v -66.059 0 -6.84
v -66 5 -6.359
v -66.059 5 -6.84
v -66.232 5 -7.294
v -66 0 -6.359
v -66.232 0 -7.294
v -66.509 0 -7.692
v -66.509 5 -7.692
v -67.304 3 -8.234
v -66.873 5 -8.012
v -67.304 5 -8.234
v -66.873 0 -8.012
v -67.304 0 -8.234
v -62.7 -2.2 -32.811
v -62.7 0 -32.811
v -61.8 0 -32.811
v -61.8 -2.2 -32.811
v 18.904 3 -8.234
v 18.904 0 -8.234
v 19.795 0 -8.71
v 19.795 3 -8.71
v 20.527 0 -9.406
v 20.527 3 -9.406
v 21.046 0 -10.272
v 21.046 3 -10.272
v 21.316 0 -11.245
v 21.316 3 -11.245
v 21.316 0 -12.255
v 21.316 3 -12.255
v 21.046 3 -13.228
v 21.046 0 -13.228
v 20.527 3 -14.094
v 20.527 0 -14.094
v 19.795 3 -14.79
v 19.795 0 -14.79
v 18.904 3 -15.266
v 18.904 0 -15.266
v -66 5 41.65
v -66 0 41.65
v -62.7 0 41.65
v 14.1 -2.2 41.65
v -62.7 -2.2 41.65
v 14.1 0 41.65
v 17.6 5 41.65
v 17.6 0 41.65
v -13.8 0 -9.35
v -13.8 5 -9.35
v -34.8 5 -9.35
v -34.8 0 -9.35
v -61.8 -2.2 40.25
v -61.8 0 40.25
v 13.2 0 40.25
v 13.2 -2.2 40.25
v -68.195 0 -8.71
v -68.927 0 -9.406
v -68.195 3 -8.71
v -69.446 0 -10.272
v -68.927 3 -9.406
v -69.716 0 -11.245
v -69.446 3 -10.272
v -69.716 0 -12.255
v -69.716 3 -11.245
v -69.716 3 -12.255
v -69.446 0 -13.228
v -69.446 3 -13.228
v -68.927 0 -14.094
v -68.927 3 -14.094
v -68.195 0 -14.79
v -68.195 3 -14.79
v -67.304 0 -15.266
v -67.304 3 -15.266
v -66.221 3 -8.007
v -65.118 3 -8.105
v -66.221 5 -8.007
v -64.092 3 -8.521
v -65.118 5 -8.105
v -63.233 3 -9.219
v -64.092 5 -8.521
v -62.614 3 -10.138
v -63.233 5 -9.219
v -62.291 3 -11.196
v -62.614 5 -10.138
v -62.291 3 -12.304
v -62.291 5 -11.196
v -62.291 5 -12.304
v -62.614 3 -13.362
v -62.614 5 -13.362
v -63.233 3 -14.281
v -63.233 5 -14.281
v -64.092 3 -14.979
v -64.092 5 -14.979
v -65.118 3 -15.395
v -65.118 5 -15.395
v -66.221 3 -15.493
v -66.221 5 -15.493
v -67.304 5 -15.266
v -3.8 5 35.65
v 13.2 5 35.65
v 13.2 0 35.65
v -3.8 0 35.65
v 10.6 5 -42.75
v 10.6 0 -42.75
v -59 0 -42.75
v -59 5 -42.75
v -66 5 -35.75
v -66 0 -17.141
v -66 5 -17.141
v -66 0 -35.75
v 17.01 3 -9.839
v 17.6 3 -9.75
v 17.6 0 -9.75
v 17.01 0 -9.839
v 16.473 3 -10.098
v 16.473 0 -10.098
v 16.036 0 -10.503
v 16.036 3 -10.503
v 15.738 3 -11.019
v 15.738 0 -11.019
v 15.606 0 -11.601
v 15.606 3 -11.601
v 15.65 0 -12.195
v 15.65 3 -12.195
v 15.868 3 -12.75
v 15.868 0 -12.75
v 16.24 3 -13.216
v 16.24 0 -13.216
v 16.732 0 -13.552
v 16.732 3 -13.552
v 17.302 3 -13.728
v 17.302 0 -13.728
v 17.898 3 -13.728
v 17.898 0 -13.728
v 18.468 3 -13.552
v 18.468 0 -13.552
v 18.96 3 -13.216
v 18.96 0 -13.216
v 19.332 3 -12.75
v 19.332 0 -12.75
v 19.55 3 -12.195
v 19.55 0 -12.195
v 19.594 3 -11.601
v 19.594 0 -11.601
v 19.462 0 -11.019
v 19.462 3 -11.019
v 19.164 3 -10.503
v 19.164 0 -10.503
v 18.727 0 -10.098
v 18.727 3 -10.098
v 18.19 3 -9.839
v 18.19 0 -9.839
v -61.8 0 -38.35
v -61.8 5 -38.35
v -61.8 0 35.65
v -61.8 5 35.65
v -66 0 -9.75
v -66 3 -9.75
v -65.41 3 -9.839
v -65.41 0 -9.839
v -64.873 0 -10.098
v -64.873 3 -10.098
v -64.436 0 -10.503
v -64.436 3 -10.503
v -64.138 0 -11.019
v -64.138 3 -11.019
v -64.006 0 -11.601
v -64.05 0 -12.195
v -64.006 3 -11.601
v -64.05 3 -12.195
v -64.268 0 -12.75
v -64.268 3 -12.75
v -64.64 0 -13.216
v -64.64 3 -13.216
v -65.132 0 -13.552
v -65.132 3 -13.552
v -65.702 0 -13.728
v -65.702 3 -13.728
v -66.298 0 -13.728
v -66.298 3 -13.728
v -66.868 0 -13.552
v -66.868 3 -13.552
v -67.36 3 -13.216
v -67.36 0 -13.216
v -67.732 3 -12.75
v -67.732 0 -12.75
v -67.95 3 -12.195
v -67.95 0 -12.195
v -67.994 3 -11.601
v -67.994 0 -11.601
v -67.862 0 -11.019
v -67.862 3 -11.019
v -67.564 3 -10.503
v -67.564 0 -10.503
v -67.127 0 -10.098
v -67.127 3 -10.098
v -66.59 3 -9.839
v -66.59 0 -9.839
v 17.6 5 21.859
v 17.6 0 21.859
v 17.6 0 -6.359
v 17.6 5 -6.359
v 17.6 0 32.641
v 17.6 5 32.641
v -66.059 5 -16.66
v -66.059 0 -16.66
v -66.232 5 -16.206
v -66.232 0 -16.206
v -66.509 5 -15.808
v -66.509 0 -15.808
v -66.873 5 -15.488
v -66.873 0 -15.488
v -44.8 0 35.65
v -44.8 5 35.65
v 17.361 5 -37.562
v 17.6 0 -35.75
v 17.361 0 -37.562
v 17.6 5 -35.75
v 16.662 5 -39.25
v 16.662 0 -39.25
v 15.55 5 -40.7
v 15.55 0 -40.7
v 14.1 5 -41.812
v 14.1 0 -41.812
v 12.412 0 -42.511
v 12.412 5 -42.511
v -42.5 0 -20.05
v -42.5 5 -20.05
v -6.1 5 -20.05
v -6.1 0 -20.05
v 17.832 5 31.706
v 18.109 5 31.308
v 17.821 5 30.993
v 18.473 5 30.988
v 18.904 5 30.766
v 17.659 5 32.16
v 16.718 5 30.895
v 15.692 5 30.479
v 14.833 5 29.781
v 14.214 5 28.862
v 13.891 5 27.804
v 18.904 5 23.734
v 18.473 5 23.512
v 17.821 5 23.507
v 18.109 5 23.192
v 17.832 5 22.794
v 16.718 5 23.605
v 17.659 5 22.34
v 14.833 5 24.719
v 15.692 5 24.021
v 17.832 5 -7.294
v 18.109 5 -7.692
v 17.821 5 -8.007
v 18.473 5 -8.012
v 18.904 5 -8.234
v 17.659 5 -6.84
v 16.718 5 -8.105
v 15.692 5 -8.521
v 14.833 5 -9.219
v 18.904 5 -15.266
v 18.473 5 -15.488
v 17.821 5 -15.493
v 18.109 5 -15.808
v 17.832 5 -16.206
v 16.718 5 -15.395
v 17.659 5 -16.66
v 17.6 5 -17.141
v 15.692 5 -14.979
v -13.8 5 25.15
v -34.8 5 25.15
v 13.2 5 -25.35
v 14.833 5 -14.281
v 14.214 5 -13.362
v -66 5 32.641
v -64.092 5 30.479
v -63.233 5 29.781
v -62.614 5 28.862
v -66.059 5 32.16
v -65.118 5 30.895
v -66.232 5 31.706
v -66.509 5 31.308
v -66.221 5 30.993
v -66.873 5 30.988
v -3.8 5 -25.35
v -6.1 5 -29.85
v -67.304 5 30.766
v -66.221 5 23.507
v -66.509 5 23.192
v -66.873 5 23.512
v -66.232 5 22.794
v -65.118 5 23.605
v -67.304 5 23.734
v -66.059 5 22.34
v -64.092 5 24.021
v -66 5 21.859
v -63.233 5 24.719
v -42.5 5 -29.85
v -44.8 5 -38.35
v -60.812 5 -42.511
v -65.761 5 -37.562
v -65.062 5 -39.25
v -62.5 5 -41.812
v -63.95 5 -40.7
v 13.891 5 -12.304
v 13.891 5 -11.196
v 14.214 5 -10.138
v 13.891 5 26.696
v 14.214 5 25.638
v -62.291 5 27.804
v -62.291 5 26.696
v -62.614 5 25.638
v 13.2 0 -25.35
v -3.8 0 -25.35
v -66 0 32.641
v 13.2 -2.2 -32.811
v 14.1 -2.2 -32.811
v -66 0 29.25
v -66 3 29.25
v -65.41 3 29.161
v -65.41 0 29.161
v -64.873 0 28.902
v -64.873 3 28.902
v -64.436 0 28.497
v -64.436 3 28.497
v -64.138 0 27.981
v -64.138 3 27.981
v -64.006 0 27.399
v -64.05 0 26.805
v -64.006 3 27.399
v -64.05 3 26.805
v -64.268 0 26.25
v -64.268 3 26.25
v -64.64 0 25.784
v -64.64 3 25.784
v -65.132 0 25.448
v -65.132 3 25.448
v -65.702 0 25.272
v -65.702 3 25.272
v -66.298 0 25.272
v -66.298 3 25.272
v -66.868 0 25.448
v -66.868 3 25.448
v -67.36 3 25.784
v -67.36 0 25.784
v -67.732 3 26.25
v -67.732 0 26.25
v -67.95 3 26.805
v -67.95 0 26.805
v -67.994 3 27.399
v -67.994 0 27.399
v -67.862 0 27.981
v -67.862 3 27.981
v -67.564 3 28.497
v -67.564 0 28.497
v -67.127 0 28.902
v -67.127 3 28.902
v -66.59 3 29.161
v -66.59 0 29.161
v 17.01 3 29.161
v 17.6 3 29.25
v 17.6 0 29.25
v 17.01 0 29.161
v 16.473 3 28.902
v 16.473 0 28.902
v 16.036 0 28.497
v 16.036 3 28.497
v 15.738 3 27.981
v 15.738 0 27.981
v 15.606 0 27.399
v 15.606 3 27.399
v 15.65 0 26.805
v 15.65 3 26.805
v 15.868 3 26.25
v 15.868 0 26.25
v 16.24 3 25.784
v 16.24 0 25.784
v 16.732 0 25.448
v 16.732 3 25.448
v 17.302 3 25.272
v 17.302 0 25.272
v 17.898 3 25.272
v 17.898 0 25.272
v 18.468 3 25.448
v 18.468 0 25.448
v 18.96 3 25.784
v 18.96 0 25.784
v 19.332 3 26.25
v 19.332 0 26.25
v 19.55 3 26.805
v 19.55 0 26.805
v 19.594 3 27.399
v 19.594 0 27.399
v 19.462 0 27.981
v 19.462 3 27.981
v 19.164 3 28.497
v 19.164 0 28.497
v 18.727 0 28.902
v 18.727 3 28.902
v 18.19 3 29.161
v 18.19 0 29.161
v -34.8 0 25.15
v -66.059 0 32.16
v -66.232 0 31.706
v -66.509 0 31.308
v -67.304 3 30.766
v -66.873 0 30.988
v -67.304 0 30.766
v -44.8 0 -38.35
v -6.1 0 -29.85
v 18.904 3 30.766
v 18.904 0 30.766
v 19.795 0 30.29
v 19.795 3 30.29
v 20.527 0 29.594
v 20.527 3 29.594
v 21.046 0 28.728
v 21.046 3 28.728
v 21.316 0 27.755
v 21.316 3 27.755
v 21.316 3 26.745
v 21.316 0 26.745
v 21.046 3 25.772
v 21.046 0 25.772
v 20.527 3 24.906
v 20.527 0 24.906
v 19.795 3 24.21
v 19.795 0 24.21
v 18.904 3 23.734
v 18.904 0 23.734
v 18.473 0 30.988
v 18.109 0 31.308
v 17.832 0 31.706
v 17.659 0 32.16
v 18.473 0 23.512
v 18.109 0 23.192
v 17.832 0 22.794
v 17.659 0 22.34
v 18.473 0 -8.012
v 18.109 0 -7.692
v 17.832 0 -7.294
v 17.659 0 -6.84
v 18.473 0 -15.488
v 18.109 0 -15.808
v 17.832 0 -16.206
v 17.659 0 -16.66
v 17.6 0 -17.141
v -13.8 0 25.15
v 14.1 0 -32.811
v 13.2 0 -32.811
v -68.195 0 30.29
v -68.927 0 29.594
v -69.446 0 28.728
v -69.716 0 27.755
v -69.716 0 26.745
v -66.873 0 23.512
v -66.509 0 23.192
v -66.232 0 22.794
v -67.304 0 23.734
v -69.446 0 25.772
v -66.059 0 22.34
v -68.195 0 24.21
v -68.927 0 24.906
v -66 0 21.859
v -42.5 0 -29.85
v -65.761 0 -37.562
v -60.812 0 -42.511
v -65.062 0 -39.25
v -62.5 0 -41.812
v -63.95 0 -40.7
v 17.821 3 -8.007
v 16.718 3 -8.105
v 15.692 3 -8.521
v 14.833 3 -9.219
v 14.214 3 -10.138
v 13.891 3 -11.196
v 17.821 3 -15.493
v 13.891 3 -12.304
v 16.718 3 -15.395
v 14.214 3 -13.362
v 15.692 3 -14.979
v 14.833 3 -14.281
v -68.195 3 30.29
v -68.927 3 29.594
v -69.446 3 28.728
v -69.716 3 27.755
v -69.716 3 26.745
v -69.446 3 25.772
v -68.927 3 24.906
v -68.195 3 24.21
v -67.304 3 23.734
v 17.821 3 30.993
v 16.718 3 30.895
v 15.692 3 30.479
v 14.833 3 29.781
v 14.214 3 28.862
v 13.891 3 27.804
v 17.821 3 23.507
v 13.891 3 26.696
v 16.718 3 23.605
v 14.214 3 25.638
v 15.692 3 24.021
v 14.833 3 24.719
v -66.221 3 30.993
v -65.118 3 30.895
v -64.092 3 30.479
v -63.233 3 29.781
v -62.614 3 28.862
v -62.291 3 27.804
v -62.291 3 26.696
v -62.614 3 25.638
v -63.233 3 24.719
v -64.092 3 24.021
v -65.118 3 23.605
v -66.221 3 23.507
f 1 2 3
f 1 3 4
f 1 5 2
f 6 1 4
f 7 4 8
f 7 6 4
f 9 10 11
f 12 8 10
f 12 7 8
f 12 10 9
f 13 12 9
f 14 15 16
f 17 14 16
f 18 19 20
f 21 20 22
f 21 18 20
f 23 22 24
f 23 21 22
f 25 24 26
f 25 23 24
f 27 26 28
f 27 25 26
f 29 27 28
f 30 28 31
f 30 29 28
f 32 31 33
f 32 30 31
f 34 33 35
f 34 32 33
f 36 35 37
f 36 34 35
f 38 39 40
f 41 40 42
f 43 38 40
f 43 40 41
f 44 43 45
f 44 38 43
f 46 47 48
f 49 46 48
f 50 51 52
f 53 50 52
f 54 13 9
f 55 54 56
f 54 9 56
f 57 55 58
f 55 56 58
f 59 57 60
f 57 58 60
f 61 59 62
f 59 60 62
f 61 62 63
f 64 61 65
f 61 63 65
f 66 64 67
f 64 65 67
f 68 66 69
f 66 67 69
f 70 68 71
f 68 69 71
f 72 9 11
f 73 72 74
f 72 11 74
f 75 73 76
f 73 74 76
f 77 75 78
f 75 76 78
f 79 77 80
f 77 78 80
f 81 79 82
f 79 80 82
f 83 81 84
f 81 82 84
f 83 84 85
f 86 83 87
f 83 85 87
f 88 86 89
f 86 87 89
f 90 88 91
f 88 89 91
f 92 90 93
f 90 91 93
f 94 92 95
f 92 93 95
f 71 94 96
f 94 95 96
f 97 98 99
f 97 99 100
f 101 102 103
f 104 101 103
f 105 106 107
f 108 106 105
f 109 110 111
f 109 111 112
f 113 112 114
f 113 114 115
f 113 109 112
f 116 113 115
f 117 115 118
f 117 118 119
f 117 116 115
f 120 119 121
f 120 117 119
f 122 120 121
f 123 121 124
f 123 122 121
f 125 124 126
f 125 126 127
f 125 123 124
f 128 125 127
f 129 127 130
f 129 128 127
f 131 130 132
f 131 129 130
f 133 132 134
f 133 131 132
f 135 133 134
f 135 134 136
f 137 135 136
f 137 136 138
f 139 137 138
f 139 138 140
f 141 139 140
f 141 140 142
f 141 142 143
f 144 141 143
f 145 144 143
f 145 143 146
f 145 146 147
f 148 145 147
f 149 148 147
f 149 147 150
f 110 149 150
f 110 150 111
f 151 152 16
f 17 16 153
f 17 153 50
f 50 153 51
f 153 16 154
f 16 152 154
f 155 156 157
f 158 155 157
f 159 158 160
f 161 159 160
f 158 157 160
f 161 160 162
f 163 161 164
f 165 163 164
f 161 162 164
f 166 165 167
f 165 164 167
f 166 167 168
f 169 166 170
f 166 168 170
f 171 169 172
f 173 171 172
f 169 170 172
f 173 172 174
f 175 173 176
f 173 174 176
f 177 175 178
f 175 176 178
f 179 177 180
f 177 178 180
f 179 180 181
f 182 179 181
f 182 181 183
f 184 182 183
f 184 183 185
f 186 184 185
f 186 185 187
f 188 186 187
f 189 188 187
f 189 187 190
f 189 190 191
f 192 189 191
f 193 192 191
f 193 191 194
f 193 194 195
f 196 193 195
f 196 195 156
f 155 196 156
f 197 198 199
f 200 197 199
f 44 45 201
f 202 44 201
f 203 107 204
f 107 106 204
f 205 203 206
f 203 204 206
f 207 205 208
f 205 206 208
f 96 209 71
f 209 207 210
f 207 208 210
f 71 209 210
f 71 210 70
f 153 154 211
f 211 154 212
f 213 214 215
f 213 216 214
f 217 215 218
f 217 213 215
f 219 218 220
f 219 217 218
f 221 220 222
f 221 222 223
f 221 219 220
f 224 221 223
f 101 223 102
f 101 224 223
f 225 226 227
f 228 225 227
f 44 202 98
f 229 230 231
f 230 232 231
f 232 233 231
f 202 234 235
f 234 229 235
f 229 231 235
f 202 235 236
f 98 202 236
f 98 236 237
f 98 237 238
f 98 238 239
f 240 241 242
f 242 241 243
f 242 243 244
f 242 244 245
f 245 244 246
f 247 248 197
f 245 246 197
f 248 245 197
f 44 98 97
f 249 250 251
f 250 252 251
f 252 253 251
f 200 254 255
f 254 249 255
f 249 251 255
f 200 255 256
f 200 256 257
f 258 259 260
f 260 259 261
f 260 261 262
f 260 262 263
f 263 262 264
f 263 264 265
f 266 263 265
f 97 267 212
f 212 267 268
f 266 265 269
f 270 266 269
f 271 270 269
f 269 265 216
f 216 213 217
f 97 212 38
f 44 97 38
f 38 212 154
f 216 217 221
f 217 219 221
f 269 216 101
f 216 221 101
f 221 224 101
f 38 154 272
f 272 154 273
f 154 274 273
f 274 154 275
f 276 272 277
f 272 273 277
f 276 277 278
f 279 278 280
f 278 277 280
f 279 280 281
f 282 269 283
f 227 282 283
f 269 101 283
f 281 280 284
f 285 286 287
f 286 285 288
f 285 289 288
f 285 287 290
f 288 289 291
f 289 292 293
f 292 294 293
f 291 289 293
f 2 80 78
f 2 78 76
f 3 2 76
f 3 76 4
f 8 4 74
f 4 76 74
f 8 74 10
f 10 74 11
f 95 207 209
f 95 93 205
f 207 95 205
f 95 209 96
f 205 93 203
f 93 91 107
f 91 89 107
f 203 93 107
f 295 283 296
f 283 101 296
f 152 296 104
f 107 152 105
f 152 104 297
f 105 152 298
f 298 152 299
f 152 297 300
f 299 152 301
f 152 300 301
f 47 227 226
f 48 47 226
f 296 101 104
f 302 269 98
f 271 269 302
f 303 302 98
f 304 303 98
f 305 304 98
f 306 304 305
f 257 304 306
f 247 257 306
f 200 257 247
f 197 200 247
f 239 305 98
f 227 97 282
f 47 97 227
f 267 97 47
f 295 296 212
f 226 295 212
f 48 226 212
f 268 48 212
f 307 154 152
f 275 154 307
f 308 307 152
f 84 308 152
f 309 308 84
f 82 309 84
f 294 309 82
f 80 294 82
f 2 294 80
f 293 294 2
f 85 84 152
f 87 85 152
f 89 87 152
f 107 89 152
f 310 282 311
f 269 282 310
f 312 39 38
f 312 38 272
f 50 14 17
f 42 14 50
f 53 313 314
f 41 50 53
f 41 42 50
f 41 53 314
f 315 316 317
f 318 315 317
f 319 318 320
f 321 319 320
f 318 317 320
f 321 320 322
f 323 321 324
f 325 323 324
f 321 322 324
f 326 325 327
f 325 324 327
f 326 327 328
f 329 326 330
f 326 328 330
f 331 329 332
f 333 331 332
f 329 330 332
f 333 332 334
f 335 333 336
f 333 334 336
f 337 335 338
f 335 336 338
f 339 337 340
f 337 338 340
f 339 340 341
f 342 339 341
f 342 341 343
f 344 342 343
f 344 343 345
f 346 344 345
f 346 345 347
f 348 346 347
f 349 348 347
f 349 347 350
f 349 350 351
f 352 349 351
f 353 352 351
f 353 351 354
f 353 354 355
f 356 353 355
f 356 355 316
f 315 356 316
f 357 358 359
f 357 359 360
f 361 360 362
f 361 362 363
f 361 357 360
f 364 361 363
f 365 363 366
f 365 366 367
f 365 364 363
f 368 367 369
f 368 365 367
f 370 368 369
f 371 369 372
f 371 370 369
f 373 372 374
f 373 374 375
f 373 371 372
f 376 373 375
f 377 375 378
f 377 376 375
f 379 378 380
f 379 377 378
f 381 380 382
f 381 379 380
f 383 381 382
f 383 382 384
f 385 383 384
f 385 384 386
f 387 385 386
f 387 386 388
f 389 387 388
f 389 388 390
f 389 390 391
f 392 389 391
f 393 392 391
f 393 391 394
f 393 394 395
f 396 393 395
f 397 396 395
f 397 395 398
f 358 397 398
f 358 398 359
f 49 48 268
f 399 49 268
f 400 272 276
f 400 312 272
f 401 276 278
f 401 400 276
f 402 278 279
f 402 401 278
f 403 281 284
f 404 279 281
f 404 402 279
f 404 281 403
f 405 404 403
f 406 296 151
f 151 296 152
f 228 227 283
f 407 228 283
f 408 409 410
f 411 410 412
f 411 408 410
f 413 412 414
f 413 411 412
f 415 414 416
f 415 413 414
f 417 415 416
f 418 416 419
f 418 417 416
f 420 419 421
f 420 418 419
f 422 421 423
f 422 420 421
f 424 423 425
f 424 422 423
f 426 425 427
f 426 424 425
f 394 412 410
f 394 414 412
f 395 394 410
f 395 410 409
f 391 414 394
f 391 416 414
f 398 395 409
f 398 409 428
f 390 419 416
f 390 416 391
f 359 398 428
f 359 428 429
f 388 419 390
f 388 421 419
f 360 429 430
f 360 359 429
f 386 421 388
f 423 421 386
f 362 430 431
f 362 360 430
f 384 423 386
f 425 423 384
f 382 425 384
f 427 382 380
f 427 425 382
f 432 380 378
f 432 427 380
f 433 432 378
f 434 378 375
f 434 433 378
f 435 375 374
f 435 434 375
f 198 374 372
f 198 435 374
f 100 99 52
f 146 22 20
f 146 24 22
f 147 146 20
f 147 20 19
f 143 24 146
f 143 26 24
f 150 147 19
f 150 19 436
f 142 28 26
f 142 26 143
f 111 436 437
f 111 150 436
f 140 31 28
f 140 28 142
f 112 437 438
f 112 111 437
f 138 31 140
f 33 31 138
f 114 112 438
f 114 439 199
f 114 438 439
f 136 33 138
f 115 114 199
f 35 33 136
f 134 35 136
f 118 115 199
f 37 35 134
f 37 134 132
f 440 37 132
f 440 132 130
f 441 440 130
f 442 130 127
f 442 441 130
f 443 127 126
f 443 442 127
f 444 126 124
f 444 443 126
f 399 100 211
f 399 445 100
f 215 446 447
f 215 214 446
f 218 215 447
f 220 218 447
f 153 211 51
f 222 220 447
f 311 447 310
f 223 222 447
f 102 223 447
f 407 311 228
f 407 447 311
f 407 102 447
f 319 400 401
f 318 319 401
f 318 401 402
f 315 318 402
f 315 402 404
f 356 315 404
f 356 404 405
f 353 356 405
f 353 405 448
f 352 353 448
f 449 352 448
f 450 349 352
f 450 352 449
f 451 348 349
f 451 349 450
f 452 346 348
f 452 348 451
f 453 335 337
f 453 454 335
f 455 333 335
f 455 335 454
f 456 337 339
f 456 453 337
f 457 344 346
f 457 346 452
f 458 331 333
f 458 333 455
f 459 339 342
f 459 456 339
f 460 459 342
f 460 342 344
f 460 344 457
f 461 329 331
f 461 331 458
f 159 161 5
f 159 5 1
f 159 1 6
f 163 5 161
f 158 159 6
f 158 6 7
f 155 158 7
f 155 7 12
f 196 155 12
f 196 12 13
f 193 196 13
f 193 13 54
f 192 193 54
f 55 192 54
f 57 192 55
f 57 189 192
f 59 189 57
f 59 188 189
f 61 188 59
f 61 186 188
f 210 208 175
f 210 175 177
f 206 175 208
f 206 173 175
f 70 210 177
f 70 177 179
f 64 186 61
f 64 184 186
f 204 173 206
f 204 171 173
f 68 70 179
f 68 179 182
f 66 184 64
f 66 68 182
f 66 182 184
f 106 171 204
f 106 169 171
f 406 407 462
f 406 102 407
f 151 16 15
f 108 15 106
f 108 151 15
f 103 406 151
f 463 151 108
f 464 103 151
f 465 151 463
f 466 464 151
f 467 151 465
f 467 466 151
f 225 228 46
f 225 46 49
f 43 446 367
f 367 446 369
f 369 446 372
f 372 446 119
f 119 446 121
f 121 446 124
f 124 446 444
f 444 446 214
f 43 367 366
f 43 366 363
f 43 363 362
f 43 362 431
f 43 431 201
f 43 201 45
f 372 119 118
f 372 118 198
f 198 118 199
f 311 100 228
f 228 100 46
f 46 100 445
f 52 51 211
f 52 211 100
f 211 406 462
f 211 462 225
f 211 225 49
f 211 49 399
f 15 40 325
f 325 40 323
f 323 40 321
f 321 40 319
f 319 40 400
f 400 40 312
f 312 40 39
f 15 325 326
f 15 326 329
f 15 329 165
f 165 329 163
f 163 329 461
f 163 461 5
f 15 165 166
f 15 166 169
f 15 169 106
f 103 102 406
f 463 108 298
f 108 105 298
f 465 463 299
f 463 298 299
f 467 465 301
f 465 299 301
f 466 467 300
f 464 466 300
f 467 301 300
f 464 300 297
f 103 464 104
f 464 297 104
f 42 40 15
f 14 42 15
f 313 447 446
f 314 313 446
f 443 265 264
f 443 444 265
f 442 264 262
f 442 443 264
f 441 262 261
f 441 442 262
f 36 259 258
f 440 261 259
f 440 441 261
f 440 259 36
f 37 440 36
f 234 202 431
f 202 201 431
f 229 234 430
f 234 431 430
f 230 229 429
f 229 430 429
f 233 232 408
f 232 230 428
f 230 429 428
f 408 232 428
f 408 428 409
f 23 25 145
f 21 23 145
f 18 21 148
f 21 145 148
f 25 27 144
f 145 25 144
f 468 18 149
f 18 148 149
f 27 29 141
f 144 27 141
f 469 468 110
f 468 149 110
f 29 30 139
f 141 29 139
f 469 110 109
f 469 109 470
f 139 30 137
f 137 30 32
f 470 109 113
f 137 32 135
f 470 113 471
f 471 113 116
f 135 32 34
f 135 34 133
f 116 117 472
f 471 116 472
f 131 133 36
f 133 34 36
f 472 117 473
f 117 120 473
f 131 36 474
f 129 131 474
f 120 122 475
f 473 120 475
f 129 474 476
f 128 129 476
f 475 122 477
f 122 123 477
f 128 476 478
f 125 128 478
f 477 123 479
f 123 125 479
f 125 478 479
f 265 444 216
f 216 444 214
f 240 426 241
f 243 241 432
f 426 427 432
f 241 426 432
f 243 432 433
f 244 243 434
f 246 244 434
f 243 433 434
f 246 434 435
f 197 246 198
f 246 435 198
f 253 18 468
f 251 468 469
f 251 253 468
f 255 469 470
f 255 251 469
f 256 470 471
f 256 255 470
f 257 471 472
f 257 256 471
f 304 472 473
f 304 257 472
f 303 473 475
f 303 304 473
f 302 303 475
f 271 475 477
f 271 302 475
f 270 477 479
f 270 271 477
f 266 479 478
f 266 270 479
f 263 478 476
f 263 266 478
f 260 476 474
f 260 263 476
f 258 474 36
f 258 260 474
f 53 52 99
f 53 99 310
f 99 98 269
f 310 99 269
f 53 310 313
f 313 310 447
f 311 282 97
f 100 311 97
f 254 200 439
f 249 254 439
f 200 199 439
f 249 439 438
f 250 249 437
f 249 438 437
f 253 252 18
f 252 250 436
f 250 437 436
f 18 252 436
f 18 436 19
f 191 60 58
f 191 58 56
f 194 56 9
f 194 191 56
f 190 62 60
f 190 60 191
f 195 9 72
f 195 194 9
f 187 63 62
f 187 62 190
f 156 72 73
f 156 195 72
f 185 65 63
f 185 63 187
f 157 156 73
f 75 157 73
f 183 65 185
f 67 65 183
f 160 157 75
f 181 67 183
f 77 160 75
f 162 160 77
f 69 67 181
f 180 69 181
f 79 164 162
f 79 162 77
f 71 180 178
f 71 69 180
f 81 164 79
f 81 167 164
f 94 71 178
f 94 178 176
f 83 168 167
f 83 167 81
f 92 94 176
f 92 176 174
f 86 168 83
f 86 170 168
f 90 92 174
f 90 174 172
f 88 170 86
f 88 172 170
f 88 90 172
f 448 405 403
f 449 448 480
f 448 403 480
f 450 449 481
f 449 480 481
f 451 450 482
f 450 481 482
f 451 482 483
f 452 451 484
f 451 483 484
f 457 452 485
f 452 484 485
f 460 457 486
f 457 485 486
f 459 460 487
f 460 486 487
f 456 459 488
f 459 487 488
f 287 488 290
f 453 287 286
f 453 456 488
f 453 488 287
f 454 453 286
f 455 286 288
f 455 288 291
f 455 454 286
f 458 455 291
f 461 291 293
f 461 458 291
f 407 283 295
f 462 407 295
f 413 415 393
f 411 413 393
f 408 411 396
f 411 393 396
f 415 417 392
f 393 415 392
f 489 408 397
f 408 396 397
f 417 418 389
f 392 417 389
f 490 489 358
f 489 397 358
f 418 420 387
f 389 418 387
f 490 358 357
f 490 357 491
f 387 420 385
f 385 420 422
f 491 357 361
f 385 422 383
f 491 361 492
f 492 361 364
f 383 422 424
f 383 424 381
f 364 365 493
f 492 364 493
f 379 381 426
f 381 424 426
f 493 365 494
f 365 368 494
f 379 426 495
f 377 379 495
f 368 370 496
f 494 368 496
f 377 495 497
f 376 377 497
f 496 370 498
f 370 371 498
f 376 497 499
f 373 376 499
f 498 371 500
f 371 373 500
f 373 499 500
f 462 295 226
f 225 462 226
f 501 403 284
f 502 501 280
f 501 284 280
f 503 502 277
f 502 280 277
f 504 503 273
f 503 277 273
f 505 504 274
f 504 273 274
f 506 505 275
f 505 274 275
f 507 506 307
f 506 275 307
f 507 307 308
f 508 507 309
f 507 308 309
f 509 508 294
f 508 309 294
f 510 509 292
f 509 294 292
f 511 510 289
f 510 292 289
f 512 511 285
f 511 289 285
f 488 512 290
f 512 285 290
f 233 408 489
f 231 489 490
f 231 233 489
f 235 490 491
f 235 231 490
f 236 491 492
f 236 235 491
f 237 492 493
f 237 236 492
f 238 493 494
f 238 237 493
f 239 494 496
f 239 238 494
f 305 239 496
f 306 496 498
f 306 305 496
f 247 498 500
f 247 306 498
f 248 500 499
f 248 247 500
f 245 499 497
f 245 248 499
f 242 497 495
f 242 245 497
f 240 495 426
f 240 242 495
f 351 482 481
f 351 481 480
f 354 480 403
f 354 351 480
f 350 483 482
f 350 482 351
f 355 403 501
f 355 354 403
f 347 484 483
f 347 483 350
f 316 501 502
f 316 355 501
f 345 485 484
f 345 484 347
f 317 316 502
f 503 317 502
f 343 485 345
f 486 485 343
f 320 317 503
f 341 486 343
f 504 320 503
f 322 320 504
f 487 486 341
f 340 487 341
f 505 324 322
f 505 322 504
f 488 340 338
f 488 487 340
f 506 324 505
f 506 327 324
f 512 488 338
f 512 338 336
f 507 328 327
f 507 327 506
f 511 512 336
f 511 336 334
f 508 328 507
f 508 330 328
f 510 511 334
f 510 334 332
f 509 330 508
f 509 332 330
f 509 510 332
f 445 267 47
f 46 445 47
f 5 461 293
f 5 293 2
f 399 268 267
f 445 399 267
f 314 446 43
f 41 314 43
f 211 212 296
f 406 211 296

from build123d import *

# Parameters (mm, degrees)
SKETCH1_W           = 132
SKETCH1_H           = 85.5
BOSS_EXTRUDE1_DEPTH = 5
BOSS_EXTRUDE3_DEPTH = 5
FILLET1_R           = 2
SKETCH5_R           = 2
CUT_EXTRUDE1_DEPTH  = 7
SKETCH6_R           = 3.75
CUT_EXTRUDE2_DEPTH  = 2
FILLET2_R           = 7
SKETCH7_W           = 101.652764849
SKETCH7_H           = 21.79377459
CUT_EXTRUDE3_DEPTH  = 90
CUT_EXTRUDE4_DEPTH  = 5
BOSS_EXTRUDE4_DEPTH = 2.2
CUT_EXTRUDE5_DEPTH  = 1.1


with BuildPart() as part:
    # Sketch1 → Boss-Extrude1 (new body)
    with BuildSketch(Plane(origin=(0, 0, 0), x_dir=(1, 0, 0), z_dir=(0, 1, 0))):
        Rectangle(SKETCH1_W, SKETCH1_H)
    extrude(amount=BOSS_EXTRUDE1_DEPTH)

    # Sketch4 → Boss-Extrude3 (add)
    with BuildSketch(Plane(origin=(0, 5, 0), x_dir=(1, 0, 0), z_dir=(0, 1, 0))):
        with BuildLine():
            Line((-66, 15.5), (-66, 8))
            ThreePointArc((-66, 8), (-69.75, 11.75), (-66, 15.5))
        make_face()
        with BuildLine():
            Line((-66, -23.5), (-66, -31))
            ThreePointArc((-66, -31), (-69.75, -27.25), (-66, -23.5))
        make_face()
        with BuildLine():
            Line((66, -31), (66, -23.5))
            ThreePointArc((66, -23.5), (69.75, -27.25), (66, -31))
        make_face()
        with BuildLine():
            Line((66, 8), (66, 15.5))
            ThreePointArc((66, 15.5), (69.75, 11.75), (66, 8))
        make_face()
    extrude(amount=-BOSS_EXTRUDE3_DEPTH)

    # Fillet1
    fillet1_edges = [part.edges().sort_by_distance(p)[0] for p in [
        (-66, 2.5, -8),
        (-66, 2.5, -15.5),
        (-66, 2.5, 31),
        (-66, 2.5, 23.5),
        (66, 2.5, 23.5),
        (66, 2.5, 31),
        (66, 2.5, -15.5),
        (66, 2.5, -8),
    ]]
    fillet(fillet1_edges, radius=FILLET1_R)

    # Sketch5 → Cut-Extrude1 (cut)
    with BuildSketch(Plane(origin=(0, 5, 0), x_dir=(1, 0, 0), z_dir=(0, 1, 0))):
        with Locations(Location((-66, 11.75, 0), (0, 0, 270))):
            Circle(SKETCH5_R)
        with Locations(Location((66, 11.75, 0), (0, 0, 270))):
            Circle(SKETCH5_R)
        with Locations(Location((66, -27.25, 0), (0, 0, 270))):
            Circle(SKETCH5_R)
        with Locations(Location((-66, -27.25, 0), (0, 0, 270))):
            Circle(SKETCH5_R)
    extrude(amount=-CUT_EXTRUDE1_DEPTH, mode=Mode.SUBTRACT)

    # Sketch6 → Cut-Extrude2 (cut)
    with BuildSketch(Plane(origin=(0, 5, 0), x_dir=(1, 0, 0), z_dir=(0, 1, 0))):
        with Locations((-66, 11.75)):
            Circle(SKETCH6_R)
        with Locations((-66, -27.25)):
            Circle(SKETCH6_R)
        with Locations((66, -27.25)):
            Circle(SKETCH6_R)
        with Locations((66, 11.75)):
            Circle(SKETCH6_R)
    extrude(amount=-CUT_EXTRUDE2_DEPTH, mode=Mode.SUBTRACT)

    # Fillet2
    fillet2_edges = [part.edges().sort_by_distance(p)[0] for p in [
        (-66, 2.5, -42.75),
        (66, 2.5, -42.75),
    ]]
    fillet(fillet2_edges, radius=FILLET2_R)

    # Sketch7 → Cut-Extrude3 (cut)
    with BuildSketch(Plane.XY.offset(42.75)):
        with Locations((26.626382425, 4.310675182)):
            Rectangle(SKETCH7_W, SKETCH7_H)
    extrude(amount=-CUT_EXTRUDE3_DEPTH, mode=Mode.SUBTRACT)

    # Mirror1: part across plane


with BuildPart() as part_1:
    add(part.part)
    add(part.part.mirror(Plane(origin=(-24.2, 15.207562477, -47.25), x_dir=(0, 0, 1), z_dir=(-1, 0, 0))))

    # Sketch9 → Cut-Extrude4 (cut)
    with BuildSketch(Plane(origin=(0, 5, 0), x_dir=(1, 0, 0), z_dir=(0, 1, 0))):
        Polygon((-44.8, -26.35), (-44.8, 38.35), (-61.8, 38.35), (-61.8, -26.35), (-61.8, -35.65), (-44.8, -35.65), align=None)
        Polygon((-34.8, -25.15), (-23.1, -25.15), (-13.8, -25.15), (-13.8, -8.65), (-13.8, 9.35), (-23.1, 9.35), (-34.8, 9.35), (-34.8, -8.65), align=None)
        Polygon((13.2, -26.35), (13.2, -35.65), (-3.8, -35.65), (-3.8, -26.35), (-3.8, 25.35), (13.2, 25.35), align=None)
        Polygon((-22.6, 29.85), (-42.5, 29.85), (-42.5, 20.05), (-6.1, 20.05), (-6.1, 29.85), align=None)
    extrude(amount=-CUT_EXTRUDE4_DEPTH, mode=Mode.SUBTRACT)

    # Sketch11 → Boss-Extrude4 (add)
    with BuildSketch(Plane.XZ):
        Polygon((14.1, 42.75), (-62.7, 42.75), (-62.7, -32.810601847), (-61.8, -32.810601847), (-61.8, 40.250110422), (13.2, 40.250110422), (13.2, -32.810601847), (14.1, -32.810601847), align=None)
    extrude(amount=BOSS_EXTRUDE4_DEPTH)

    # Sketch12 → Cut-Extrude5 (cut)
    with BuildSketch(Plane.XY.offset(42.75)):
        Polygon((-66, 0), (-62.7, 0), (-62.7, -2.2), (14.1, -2.2), (14.1, 0), (17.6, 0), (17.6, 5), (-66, 5), align=None)
    extrude(amount=-CUT_EXTRUDE5_DEPTH, mode=Mode.SUBTRACT)


solid = part_1.part
